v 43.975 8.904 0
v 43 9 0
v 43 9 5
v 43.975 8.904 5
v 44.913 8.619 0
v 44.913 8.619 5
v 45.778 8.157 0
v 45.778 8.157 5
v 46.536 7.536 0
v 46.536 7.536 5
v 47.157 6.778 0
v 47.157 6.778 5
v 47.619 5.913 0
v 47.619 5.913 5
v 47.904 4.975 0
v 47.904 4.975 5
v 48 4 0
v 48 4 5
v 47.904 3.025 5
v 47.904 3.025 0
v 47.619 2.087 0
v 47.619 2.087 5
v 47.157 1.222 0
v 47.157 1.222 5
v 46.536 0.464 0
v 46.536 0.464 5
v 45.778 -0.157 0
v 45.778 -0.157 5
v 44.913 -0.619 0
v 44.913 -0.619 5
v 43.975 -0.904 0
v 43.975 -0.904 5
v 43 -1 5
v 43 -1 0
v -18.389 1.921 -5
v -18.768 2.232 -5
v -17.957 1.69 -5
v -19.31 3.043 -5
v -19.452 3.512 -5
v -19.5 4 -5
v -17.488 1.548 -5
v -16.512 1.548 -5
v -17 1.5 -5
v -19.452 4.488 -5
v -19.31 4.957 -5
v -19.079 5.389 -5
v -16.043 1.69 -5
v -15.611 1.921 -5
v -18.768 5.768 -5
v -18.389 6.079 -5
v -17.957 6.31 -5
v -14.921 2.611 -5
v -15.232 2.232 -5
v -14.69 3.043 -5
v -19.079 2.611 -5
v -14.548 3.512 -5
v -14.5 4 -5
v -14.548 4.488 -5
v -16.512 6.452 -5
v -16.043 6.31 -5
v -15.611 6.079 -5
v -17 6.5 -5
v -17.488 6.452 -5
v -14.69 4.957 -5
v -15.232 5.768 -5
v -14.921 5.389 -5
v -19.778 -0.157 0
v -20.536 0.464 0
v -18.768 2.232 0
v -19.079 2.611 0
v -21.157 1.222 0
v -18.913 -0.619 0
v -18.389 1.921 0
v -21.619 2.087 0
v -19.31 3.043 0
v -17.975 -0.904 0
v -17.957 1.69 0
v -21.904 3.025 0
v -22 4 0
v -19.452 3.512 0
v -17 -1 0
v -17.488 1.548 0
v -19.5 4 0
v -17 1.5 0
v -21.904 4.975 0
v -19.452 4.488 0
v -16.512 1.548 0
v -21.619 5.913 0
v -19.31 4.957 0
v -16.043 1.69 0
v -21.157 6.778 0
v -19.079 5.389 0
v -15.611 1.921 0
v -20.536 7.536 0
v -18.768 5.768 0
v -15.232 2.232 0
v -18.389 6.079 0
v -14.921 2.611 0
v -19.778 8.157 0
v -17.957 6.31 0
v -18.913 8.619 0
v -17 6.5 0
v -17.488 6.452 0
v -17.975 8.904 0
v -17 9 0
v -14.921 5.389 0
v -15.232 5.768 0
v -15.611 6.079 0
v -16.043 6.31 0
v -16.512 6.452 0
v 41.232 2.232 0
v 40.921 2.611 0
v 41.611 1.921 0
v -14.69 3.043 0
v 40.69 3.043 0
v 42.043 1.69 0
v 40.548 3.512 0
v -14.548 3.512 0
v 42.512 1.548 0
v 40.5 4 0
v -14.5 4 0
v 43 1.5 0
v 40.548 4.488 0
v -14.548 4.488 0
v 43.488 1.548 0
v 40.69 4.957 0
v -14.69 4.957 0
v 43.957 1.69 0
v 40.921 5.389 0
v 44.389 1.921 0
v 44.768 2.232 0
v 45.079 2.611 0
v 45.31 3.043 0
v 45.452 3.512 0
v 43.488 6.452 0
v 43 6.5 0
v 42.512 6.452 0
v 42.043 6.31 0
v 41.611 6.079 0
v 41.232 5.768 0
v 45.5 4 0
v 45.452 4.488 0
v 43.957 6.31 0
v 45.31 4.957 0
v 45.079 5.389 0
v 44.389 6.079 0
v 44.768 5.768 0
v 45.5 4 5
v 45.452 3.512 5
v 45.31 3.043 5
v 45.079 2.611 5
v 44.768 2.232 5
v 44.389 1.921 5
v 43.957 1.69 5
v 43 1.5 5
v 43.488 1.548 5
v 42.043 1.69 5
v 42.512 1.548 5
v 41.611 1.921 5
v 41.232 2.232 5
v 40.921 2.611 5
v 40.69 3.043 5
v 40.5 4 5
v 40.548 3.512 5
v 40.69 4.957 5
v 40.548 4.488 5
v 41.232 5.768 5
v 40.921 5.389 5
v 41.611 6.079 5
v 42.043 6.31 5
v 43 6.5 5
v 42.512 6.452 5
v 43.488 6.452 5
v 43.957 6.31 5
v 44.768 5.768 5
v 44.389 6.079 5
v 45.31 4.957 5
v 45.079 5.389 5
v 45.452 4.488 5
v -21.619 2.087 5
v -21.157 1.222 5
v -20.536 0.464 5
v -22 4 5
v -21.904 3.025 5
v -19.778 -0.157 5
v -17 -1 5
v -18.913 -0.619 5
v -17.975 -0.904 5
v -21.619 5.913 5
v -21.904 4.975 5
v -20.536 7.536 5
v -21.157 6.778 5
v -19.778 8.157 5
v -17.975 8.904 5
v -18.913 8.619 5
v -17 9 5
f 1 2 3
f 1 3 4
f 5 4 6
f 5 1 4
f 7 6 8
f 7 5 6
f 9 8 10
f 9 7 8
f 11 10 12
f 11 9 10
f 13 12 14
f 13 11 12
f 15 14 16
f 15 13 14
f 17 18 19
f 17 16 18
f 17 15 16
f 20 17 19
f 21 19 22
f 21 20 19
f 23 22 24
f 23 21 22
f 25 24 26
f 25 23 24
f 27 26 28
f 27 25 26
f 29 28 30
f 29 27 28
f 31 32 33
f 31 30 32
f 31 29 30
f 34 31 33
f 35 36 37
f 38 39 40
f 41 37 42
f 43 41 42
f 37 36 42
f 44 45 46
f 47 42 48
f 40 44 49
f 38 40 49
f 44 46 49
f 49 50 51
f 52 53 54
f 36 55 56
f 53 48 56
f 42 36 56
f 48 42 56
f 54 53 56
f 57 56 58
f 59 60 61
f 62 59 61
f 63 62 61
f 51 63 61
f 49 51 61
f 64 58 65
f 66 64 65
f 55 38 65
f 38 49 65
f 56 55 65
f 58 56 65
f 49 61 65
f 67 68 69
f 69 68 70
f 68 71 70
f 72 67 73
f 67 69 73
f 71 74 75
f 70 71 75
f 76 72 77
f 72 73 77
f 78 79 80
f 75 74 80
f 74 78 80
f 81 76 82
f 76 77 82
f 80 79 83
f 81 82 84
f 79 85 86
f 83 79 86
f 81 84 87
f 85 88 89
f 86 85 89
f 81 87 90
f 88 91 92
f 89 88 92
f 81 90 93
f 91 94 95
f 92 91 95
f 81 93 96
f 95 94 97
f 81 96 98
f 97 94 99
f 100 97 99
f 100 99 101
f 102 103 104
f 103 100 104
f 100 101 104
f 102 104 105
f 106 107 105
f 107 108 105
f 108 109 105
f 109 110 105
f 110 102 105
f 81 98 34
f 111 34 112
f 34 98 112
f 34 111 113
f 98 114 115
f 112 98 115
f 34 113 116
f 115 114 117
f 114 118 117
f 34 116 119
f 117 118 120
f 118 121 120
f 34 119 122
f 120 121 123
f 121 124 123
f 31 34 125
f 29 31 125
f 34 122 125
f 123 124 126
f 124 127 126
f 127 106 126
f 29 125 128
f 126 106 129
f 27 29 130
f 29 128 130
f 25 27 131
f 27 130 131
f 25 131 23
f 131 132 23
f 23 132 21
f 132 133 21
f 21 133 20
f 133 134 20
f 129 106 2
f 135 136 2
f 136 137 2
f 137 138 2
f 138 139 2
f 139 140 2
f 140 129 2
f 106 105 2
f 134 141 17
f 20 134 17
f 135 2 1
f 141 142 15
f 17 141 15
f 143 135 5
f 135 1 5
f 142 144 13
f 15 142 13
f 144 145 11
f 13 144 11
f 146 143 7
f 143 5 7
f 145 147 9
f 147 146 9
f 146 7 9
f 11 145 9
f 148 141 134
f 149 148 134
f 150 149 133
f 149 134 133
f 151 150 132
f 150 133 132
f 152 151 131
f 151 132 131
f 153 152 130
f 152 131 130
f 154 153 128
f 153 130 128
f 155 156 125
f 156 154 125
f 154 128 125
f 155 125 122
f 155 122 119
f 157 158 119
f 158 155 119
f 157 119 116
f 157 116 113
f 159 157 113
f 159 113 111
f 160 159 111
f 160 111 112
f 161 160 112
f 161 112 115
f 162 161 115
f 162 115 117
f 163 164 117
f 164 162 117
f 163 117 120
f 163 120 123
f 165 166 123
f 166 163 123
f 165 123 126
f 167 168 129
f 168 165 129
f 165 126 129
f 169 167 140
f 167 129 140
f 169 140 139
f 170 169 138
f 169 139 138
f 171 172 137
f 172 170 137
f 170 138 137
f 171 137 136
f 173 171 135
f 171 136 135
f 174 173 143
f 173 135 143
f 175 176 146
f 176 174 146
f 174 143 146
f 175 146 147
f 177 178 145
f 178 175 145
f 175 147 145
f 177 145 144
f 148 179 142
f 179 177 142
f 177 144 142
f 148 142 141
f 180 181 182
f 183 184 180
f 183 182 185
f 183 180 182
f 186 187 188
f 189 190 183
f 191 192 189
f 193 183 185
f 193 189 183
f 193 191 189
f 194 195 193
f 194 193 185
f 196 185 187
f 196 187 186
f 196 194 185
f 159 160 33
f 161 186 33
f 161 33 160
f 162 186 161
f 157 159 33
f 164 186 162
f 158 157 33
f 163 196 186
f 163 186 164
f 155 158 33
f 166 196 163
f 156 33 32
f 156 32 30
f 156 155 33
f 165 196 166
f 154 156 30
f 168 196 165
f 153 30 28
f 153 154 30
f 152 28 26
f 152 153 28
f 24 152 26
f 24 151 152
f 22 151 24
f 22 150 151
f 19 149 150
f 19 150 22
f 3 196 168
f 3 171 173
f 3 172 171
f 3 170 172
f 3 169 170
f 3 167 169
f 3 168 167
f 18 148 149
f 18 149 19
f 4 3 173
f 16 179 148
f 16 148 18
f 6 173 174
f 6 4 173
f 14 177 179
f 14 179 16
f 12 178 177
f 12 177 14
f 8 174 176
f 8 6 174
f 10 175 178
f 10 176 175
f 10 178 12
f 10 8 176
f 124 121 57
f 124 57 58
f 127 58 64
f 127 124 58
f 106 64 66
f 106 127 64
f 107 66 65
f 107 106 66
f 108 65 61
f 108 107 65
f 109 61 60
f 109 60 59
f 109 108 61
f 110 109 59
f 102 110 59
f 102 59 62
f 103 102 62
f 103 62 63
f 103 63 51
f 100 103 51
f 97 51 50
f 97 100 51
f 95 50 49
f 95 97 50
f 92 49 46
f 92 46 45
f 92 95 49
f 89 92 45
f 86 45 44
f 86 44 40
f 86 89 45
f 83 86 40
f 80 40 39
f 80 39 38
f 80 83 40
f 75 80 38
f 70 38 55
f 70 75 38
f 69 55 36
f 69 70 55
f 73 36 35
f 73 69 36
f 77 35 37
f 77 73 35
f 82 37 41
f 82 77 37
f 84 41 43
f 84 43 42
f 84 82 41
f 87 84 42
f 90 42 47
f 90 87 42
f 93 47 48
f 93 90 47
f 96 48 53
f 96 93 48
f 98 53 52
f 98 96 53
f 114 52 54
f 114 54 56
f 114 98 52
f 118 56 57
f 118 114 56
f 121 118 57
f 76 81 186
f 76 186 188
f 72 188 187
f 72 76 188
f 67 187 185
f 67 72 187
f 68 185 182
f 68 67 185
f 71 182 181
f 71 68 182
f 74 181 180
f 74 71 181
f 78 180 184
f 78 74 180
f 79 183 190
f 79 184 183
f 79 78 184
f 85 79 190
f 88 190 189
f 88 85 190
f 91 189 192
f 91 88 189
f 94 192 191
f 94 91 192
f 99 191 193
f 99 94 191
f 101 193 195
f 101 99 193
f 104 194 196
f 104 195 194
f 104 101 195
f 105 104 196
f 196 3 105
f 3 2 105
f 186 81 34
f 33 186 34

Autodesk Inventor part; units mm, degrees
ref_plane "YZ Plane" through (0, 0, 0) normal (1, 0, 0) x (0, 1, 0)
ref_plane "XZ Plane" through (0, 0, 0) normal (0, 1, 0) x (-1, 0, 0)
ref_plane "XY Plane" through (0, 0, 0) normal (0, 0, 1) x (1, 0, 0)
sketch "Sketch1" plane through (0, 0, 0) normal (0, 0, 1) x (1, 0, 0)
  line L0 (-17, 4) -> (43, 4) construction
  line L1 (-17, -1) -> (43, -1)
  line L2 (43, 9) -> (-17, 9)
  arc A0 (-17, 9) -> (-17, -1) centre (-17, 4) ccw
  arc A1 (43, -1) -> (43, 9) centre (43, 4) ccw
  circle A2 centre (-17, 4) radius 2.5
  circle A3 centre (43, 4) radius 2.5
  point P0 (0, 0)
  point P1 (13, 4)
  dimension "d0" = 60
  dimension "d1" = 10
  dimension "d2" = 5
extrude "Extrusion1" add sketch "Sketch1" along normal blind 5 contours A0 L2 A1 L1 | A2
extrude "Extrusion2" add sketch "Sketch1" against normal blind 5 contours A2
